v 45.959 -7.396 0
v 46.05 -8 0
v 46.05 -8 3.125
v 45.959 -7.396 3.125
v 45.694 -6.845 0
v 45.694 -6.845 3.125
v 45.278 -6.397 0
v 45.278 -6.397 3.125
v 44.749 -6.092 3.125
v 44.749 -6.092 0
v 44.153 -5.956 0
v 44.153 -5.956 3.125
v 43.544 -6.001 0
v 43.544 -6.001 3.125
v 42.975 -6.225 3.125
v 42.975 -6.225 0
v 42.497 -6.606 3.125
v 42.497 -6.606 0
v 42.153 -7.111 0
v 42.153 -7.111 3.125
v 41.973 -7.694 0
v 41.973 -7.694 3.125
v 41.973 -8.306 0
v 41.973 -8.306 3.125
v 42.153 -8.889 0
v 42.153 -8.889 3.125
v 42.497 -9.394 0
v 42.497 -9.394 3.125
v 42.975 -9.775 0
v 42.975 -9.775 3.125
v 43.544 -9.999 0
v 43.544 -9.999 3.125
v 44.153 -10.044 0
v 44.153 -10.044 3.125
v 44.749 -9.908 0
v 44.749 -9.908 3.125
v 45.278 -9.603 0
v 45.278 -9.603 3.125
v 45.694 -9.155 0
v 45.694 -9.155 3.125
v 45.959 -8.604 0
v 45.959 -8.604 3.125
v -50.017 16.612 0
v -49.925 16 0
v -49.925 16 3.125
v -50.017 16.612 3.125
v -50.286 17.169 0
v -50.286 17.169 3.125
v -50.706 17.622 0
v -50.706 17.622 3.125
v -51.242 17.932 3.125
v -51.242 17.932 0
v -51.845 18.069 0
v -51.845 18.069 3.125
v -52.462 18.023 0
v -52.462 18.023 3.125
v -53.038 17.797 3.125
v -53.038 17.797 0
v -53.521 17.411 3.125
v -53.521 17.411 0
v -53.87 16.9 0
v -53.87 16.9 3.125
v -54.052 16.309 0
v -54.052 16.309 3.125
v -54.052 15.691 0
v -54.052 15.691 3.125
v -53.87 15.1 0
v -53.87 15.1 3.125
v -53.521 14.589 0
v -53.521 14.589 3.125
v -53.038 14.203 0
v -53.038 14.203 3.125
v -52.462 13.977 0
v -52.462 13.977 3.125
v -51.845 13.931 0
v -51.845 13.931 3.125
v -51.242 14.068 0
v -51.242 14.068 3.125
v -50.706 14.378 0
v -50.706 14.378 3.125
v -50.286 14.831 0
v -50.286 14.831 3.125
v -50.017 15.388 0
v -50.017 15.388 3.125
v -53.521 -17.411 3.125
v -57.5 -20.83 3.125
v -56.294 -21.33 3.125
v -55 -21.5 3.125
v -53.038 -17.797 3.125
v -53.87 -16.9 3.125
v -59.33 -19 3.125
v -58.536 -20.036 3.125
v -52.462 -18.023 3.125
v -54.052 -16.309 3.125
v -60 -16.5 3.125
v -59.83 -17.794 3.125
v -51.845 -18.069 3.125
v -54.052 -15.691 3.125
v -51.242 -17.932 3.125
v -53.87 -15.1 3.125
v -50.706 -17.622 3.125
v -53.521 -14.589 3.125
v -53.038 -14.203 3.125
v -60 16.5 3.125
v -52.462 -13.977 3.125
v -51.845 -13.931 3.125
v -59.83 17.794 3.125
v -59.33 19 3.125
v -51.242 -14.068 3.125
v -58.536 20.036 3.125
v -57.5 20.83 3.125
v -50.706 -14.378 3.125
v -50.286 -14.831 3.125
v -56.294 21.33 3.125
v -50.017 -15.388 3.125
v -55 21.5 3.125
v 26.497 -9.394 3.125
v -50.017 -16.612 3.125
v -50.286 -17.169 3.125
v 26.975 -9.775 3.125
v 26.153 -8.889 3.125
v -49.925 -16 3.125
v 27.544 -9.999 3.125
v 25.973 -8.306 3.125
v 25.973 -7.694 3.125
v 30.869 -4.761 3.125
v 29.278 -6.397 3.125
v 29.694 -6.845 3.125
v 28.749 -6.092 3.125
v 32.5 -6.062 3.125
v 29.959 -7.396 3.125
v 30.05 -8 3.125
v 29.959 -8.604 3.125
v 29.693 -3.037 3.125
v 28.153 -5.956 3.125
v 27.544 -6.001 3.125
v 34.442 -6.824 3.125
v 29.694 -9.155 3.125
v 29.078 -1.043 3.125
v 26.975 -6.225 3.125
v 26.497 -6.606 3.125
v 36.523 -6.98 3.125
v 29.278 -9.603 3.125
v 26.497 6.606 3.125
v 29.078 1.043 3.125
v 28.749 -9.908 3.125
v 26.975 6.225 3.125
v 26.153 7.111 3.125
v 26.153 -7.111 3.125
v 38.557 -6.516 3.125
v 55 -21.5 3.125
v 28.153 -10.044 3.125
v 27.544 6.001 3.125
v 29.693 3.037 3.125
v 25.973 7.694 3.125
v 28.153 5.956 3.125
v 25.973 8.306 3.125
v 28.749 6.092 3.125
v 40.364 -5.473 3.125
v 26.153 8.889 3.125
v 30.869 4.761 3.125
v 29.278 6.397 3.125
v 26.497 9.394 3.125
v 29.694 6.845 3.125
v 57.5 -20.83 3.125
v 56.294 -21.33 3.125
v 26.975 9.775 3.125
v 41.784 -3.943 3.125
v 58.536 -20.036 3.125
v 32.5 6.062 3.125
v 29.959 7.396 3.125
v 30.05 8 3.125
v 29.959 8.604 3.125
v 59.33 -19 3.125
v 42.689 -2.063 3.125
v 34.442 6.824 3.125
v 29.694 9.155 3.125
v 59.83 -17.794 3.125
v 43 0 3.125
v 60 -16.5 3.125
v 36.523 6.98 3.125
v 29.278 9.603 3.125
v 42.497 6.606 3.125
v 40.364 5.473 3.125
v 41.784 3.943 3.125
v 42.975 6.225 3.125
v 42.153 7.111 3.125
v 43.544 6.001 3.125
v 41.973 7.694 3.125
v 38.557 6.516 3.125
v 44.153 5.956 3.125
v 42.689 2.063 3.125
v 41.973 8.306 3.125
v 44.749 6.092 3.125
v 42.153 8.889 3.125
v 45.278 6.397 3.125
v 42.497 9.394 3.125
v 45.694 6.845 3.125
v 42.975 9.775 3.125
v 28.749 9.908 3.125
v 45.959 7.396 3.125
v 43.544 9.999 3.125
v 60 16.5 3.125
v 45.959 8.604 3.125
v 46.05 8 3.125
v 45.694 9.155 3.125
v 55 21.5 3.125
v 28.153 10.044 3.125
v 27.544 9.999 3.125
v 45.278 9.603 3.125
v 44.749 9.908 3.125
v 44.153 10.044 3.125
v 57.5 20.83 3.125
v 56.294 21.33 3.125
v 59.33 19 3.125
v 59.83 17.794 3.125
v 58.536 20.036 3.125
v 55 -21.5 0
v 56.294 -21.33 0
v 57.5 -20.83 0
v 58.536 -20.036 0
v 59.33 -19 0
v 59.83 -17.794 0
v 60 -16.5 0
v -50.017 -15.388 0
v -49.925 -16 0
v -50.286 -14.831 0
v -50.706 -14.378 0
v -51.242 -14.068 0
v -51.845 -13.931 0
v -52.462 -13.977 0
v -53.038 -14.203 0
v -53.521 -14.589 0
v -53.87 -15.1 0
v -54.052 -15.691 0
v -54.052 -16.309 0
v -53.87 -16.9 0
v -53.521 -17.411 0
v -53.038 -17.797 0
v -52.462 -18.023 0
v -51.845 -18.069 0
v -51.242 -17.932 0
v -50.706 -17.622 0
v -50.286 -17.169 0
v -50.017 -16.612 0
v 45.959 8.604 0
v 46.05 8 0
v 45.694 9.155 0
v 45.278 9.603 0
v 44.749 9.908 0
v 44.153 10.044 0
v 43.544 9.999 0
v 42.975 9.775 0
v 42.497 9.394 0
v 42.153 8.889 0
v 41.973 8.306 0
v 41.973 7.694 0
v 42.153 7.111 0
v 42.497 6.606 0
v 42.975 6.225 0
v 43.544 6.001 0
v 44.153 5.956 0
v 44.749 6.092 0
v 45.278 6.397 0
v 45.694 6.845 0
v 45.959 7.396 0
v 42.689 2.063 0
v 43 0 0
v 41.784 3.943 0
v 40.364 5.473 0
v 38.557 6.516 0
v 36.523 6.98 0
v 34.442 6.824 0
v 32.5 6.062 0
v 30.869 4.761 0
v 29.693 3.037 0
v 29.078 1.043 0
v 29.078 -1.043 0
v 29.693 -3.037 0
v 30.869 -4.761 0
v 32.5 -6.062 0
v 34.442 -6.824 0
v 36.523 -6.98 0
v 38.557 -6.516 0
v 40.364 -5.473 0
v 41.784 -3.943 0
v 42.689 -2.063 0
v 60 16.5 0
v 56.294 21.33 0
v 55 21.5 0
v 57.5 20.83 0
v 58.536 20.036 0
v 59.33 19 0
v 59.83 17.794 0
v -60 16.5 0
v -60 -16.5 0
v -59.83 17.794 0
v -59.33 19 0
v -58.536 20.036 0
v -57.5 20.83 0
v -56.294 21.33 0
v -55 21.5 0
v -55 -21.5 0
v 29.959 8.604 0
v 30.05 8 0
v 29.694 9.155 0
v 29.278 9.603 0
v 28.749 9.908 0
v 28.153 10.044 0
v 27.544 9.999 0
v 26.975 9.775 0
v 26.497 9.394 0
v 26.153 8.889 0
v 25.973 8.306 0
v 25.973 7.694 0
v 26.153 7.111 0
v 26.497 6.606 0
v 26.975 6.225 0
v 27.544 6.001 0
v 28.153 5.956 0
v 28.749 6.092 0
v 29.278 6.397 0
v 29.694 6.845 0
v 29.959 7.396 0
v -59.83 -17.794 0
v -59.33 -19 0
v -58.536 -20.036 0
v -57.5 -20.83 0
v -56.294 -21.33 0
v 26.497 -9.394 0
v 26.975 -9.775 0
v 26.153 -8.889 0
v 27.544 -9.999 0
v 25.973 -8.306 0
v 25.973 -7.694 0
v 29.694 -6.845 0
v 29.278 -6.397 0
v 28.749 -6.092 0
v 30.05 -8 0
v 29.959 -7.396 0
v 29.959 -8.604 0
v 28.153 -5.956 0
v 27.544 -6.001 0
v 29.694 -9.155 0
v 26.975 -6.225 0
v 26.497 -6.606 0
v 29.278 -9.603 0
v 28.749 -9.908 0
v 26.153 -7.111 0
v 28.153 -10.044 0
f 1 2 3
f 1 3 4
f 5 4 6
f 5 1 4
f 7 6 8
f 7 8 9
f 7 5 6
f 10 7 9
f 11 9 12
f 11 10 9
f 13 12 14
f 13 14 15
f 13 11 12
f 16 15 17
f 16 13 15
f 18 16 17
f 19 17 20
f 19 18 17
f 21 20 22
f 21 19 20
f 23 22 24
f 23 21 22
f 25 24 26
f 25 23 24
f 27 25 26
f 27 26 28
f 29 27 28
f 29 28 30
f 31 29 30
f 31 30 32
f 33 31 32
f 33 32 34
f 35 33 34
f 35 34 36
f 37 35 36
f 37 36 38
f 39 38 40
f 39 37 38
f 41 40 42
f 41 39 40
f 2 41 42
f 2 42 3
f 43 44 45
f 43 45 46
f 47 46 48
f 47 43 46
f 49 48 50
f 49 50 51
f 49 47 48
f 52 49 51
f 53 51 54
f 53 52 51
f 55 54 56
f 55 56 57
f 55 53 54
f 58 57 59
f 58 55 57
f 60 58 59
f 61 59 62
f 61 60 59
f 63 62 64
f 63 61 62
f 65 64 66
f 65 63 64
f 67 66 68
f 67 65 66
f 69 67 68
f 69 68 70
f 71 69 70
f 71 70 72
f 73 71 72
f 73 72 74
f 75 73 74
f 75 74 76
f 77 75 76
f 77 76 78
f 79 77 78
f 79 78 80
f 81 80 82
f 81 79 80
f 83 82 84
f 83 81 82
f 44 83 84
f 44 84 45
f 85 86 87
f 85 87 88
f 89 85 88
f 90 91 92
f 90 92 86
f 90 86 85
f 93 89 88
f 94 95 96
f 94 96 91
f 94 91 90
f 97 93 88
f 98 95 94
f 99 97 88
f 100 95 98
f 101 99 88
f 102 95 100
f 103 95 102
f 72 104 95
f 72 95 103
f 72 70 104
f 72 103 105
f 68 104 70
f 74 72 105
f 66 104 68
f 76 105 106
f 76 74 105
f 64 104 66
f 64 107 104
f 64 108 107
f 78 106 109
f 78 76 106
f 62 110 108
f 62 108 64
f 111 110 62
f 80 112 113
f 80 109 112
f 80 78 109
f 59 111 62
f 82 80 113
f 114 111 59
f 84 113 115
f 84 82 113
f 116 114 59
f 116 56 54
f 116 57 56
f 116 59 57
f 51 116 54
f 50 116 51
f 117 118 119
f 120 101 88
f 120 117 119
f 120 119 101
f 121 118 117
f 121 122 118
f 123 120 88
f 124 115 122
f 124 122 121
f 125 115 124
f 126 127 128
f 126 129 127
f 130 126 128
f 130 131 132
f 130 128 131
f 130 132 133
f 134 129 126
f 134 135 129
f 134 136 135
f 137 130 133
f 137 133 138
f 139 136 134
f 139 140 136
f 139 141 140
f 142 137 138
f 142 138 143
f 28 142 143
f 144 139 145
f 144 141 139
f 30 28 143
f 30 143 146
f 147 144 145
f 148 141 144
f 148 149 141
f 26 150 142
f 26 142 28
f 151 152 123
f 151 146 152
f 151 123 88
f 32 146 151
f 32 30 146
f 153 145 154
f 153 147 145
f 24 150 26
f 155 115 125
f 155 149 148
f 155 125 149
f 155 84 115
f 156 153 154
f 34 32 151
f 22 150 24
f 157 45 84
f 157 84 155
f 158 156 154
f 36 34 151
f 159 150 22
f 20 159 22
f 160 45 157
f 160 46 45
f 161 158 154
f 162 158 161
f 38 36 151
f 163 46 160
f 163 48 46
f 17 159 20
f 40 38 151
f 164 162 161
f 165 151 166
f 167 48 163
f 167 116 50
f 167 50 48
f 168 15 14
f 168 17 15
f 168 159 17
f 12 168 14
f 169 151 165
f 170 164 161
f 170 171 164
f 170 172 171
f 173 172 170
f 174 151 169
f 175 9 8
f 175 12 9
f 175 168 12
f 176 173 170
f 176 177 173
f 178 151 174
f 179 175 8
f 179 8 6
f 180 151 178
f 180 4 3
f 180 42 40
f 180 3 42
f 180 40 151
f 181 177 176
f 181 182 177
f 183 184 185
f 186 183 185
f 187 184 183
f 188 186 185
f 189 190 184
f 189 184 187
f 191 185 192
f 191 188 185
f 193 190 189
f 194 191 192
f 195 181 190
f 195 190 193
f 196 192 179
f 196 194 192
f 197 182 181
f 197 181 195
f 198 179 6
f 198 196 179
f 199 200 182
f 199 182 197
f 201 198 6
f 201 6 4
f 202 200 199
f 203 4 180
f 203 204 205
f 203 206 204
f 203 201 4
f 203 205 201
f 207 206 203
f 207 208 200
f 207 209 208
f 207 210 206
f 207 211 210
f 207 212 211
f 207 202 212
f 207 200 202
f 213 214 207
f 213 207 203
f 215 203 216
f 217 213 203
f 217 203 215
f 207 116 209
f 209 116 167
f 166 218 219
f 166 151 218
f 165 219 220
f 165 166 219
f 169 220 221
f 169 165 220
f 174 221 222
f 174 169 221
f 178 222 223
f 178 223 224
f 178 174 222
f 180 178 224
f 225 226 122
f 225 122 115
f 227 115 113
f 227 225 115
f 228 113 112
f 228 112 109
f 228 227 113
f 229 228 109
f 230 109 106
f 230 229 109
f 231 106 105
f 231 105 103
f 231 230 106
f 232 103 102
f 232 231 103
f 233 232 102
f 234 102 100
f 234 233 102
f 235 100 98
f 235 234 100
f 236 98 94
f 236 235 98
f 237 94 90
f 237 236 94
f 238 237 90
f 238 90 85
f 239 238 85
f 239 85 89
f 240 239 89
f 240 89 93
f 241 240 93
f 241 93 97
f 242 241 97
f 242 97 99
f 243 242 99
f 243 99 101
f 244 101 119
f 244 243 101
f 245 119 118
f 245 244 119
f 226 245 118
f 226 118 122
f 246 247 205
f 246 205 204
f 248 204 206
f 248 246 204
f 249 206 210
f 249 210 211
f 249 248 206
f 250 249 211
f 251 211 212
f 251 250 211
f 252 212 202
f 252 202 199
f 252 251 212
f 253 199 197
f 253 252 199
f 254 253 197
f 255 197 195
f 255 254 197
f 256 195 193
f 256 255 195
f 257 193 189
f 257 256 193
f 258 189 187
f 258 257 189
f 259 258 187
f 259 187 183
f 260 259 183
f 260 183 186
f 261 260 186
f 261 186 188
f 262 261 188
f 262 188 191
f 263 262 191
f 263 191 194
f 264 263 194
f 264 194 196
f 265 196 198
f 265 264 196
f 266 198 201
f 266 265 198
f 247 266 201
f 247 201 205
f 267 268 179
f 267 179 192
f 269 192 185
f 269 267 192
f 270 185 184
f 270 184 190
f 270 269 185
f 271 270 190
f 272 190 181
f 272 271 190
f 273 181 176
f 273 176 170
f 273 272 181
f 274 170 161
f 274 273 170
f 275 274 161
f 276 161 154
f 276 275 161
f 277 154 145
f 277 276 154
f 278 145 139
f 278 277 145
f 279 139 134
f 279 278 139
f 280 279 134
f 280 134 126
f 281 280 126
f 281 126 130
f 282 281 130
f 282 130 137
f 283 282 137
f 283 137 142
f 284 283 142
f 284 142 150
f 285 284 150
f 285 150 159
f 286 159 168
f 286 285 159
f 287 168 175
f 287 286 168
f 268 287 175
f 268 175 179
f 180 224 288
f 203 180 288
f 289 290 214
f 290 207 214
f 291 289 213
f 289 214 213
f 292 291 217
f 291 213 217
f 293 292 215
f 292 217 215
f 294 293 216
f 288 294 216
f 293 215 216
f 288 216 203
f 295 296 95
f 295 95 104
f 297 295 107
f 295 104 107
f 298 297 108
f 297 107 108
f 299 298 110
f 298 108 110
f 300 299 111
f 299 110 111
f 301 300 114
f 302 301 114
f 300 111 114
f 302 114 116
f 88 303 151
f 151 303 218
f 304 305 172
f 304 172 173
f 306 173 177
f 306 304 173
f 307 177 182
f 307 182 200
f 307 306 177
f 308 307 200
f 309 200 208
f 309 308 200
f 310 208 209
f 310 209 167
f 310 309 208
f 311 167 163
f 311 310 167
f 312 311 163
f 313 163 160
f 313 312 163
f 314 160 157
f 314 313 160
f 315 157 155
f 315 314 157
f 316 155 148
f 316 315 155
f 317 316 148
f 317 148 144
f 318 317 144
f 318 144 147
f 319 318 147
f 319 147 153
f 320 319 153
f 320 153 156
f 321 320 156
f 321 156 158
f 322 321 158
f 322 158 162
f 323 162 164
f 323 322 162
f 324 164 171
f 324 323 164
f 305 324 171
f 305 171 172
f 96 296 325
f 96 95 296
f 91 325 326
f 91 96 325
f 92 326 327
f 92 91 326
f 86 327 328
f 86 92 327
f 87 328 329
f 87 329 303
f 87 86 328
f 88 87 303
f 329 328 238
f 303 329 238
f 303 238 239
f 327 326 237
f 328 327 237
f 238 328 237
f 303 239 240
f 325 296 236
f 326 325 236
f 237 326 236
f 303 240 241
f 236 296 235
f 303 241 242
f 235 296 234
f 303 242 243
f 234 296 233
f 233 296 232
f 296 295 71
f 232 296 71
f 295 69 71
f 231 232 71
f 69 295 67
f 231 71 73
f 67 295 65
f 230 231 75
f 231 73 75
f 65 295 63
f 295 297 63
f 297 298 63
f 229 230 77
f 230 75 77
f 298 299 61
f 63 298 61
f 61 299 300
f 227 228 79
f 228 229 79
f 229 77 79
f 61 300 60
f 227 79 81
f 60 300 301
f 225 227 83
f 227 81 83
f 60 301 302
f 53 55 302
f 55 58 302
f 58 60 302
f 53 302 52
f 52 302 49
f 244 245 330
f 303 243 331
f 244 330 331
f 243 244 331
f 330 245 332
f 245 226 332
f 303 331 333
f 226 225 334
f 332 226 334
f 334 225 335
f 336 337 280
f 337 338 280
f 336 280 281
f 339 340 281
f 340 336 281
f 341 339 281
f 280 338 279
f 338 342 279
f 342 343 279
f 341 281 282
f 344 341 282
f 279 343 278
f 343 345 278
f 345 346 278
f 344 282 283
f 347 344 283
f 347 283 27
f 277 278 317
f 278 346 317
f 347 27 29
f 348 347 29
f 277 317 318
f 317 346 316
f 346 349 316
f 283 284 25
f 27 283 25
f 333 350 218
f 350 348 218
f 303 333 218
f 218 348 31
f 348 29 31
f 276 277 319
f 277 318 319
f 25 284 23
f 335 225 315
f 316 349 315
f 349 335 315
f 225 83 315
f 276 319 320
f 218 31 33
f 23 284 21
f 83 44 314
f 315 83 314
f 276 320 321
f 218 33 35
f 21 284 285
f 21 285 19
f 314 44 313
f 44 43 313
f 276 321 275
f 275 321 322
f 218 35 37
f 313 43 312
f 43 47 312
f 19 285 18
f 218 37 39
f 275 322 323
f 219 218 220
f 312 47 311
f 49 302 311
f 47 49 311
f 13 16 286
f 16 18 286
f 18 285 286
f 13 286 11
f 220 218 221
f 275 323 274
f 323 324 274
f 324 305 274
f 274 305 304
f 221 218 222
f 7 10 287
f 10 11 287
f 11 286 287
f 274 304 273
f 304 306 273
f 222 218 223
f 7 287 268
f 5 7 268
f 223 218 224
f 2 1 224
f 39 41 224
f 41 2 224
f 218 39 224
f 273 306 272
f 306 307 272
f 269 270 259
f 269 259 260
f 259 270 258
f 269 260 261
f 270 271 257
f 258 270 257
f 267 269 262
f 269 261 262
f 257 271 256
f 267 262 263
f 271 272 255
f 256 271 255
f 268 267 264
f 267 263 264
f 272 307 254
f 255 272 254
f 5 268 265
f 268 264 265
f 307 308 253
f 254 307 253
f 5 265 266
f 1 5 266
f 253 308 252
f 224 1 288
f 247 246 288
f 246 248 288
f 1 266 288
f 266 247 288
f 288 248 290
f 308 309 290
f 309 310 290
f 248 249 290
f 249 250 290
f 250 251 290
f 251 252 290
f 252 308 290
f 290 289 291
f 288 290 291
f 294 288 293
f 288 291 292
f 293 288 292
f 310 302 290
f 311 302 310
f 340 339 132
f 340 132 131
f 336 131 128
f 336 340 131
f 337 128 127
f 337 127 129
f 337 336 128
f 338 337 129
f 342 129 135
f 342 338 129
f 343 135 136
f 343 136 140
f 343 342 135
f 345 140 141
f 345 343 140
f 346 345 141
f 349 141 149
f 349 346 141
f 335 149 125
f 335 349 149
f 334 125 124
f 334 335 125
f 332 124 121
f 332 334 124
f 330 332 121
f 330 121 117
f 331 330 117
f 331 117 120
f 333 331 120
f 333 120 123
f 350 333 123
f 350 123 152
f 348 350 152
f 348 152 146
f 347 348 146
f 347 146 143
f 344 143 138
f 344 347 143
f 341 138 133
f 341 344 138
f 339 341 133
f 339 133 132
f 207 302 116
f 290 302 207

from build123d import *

# Parameters (mm, degrees)
SKETCH1_W           = 120
SKETCH1_H           = 43
SKETCH1_R           = 2.075
SKETCH1_R_2         = 2.05
SKETCH1_R_3         = 7
BOSS_EXTRUDE1_DEPTH = 3.125
FILLET1_R           = 5


with BuildPart() as part:
    # Sketch1 → Boss-Extrude1 (new body)
    with BuildSketch(Plane.XY):
        Rectangle(SKETCH1_W, SKETCH1_H)
        with Locations((-52, 16)):
            Circle(SKETCH1_R, mode=Mode.SUBTRACT)
        with Locations((-52, -16)):
            Circle(SKETCH1_R, mode=Mode.SUBTRACT)
        with Locations((28, 8)):
            Circle(SKETCH1_R_2, mode=Mode.SUBTRACT)
        with Locations((44, 8)):
            Circle(SKETCH1_R_2, mode=Mode.SUBTRACT)
        with Locations((44, -8)):
            Circle(SKETCH1_R_2, mode=Mode.SUBTRACT)
        with Locations((36, 0)):
            Circle(SKETCH1_R_3, mode=Mode.SUBTRACT)
        with Locations((28, -8)):
            Circle(SKETCH1_R_2, mode=Mode.SUBTRACT)
    extrude(amount=BOSS_EXTRUDE1_DEPTH)

    # Fillet1
    fillet1_edges = [part.edges().sort_by_distance(p)[0] for p in [
        (-60, 21.5, 1.5625),
        (60, 21.5, 1.5625),
        (60, -21.5, 1.5625),
        (-60, -21.5, 1.5625),
    ]]
    fillet(fillet1_edges, radius=FILLET1_R)


solid = part.part
